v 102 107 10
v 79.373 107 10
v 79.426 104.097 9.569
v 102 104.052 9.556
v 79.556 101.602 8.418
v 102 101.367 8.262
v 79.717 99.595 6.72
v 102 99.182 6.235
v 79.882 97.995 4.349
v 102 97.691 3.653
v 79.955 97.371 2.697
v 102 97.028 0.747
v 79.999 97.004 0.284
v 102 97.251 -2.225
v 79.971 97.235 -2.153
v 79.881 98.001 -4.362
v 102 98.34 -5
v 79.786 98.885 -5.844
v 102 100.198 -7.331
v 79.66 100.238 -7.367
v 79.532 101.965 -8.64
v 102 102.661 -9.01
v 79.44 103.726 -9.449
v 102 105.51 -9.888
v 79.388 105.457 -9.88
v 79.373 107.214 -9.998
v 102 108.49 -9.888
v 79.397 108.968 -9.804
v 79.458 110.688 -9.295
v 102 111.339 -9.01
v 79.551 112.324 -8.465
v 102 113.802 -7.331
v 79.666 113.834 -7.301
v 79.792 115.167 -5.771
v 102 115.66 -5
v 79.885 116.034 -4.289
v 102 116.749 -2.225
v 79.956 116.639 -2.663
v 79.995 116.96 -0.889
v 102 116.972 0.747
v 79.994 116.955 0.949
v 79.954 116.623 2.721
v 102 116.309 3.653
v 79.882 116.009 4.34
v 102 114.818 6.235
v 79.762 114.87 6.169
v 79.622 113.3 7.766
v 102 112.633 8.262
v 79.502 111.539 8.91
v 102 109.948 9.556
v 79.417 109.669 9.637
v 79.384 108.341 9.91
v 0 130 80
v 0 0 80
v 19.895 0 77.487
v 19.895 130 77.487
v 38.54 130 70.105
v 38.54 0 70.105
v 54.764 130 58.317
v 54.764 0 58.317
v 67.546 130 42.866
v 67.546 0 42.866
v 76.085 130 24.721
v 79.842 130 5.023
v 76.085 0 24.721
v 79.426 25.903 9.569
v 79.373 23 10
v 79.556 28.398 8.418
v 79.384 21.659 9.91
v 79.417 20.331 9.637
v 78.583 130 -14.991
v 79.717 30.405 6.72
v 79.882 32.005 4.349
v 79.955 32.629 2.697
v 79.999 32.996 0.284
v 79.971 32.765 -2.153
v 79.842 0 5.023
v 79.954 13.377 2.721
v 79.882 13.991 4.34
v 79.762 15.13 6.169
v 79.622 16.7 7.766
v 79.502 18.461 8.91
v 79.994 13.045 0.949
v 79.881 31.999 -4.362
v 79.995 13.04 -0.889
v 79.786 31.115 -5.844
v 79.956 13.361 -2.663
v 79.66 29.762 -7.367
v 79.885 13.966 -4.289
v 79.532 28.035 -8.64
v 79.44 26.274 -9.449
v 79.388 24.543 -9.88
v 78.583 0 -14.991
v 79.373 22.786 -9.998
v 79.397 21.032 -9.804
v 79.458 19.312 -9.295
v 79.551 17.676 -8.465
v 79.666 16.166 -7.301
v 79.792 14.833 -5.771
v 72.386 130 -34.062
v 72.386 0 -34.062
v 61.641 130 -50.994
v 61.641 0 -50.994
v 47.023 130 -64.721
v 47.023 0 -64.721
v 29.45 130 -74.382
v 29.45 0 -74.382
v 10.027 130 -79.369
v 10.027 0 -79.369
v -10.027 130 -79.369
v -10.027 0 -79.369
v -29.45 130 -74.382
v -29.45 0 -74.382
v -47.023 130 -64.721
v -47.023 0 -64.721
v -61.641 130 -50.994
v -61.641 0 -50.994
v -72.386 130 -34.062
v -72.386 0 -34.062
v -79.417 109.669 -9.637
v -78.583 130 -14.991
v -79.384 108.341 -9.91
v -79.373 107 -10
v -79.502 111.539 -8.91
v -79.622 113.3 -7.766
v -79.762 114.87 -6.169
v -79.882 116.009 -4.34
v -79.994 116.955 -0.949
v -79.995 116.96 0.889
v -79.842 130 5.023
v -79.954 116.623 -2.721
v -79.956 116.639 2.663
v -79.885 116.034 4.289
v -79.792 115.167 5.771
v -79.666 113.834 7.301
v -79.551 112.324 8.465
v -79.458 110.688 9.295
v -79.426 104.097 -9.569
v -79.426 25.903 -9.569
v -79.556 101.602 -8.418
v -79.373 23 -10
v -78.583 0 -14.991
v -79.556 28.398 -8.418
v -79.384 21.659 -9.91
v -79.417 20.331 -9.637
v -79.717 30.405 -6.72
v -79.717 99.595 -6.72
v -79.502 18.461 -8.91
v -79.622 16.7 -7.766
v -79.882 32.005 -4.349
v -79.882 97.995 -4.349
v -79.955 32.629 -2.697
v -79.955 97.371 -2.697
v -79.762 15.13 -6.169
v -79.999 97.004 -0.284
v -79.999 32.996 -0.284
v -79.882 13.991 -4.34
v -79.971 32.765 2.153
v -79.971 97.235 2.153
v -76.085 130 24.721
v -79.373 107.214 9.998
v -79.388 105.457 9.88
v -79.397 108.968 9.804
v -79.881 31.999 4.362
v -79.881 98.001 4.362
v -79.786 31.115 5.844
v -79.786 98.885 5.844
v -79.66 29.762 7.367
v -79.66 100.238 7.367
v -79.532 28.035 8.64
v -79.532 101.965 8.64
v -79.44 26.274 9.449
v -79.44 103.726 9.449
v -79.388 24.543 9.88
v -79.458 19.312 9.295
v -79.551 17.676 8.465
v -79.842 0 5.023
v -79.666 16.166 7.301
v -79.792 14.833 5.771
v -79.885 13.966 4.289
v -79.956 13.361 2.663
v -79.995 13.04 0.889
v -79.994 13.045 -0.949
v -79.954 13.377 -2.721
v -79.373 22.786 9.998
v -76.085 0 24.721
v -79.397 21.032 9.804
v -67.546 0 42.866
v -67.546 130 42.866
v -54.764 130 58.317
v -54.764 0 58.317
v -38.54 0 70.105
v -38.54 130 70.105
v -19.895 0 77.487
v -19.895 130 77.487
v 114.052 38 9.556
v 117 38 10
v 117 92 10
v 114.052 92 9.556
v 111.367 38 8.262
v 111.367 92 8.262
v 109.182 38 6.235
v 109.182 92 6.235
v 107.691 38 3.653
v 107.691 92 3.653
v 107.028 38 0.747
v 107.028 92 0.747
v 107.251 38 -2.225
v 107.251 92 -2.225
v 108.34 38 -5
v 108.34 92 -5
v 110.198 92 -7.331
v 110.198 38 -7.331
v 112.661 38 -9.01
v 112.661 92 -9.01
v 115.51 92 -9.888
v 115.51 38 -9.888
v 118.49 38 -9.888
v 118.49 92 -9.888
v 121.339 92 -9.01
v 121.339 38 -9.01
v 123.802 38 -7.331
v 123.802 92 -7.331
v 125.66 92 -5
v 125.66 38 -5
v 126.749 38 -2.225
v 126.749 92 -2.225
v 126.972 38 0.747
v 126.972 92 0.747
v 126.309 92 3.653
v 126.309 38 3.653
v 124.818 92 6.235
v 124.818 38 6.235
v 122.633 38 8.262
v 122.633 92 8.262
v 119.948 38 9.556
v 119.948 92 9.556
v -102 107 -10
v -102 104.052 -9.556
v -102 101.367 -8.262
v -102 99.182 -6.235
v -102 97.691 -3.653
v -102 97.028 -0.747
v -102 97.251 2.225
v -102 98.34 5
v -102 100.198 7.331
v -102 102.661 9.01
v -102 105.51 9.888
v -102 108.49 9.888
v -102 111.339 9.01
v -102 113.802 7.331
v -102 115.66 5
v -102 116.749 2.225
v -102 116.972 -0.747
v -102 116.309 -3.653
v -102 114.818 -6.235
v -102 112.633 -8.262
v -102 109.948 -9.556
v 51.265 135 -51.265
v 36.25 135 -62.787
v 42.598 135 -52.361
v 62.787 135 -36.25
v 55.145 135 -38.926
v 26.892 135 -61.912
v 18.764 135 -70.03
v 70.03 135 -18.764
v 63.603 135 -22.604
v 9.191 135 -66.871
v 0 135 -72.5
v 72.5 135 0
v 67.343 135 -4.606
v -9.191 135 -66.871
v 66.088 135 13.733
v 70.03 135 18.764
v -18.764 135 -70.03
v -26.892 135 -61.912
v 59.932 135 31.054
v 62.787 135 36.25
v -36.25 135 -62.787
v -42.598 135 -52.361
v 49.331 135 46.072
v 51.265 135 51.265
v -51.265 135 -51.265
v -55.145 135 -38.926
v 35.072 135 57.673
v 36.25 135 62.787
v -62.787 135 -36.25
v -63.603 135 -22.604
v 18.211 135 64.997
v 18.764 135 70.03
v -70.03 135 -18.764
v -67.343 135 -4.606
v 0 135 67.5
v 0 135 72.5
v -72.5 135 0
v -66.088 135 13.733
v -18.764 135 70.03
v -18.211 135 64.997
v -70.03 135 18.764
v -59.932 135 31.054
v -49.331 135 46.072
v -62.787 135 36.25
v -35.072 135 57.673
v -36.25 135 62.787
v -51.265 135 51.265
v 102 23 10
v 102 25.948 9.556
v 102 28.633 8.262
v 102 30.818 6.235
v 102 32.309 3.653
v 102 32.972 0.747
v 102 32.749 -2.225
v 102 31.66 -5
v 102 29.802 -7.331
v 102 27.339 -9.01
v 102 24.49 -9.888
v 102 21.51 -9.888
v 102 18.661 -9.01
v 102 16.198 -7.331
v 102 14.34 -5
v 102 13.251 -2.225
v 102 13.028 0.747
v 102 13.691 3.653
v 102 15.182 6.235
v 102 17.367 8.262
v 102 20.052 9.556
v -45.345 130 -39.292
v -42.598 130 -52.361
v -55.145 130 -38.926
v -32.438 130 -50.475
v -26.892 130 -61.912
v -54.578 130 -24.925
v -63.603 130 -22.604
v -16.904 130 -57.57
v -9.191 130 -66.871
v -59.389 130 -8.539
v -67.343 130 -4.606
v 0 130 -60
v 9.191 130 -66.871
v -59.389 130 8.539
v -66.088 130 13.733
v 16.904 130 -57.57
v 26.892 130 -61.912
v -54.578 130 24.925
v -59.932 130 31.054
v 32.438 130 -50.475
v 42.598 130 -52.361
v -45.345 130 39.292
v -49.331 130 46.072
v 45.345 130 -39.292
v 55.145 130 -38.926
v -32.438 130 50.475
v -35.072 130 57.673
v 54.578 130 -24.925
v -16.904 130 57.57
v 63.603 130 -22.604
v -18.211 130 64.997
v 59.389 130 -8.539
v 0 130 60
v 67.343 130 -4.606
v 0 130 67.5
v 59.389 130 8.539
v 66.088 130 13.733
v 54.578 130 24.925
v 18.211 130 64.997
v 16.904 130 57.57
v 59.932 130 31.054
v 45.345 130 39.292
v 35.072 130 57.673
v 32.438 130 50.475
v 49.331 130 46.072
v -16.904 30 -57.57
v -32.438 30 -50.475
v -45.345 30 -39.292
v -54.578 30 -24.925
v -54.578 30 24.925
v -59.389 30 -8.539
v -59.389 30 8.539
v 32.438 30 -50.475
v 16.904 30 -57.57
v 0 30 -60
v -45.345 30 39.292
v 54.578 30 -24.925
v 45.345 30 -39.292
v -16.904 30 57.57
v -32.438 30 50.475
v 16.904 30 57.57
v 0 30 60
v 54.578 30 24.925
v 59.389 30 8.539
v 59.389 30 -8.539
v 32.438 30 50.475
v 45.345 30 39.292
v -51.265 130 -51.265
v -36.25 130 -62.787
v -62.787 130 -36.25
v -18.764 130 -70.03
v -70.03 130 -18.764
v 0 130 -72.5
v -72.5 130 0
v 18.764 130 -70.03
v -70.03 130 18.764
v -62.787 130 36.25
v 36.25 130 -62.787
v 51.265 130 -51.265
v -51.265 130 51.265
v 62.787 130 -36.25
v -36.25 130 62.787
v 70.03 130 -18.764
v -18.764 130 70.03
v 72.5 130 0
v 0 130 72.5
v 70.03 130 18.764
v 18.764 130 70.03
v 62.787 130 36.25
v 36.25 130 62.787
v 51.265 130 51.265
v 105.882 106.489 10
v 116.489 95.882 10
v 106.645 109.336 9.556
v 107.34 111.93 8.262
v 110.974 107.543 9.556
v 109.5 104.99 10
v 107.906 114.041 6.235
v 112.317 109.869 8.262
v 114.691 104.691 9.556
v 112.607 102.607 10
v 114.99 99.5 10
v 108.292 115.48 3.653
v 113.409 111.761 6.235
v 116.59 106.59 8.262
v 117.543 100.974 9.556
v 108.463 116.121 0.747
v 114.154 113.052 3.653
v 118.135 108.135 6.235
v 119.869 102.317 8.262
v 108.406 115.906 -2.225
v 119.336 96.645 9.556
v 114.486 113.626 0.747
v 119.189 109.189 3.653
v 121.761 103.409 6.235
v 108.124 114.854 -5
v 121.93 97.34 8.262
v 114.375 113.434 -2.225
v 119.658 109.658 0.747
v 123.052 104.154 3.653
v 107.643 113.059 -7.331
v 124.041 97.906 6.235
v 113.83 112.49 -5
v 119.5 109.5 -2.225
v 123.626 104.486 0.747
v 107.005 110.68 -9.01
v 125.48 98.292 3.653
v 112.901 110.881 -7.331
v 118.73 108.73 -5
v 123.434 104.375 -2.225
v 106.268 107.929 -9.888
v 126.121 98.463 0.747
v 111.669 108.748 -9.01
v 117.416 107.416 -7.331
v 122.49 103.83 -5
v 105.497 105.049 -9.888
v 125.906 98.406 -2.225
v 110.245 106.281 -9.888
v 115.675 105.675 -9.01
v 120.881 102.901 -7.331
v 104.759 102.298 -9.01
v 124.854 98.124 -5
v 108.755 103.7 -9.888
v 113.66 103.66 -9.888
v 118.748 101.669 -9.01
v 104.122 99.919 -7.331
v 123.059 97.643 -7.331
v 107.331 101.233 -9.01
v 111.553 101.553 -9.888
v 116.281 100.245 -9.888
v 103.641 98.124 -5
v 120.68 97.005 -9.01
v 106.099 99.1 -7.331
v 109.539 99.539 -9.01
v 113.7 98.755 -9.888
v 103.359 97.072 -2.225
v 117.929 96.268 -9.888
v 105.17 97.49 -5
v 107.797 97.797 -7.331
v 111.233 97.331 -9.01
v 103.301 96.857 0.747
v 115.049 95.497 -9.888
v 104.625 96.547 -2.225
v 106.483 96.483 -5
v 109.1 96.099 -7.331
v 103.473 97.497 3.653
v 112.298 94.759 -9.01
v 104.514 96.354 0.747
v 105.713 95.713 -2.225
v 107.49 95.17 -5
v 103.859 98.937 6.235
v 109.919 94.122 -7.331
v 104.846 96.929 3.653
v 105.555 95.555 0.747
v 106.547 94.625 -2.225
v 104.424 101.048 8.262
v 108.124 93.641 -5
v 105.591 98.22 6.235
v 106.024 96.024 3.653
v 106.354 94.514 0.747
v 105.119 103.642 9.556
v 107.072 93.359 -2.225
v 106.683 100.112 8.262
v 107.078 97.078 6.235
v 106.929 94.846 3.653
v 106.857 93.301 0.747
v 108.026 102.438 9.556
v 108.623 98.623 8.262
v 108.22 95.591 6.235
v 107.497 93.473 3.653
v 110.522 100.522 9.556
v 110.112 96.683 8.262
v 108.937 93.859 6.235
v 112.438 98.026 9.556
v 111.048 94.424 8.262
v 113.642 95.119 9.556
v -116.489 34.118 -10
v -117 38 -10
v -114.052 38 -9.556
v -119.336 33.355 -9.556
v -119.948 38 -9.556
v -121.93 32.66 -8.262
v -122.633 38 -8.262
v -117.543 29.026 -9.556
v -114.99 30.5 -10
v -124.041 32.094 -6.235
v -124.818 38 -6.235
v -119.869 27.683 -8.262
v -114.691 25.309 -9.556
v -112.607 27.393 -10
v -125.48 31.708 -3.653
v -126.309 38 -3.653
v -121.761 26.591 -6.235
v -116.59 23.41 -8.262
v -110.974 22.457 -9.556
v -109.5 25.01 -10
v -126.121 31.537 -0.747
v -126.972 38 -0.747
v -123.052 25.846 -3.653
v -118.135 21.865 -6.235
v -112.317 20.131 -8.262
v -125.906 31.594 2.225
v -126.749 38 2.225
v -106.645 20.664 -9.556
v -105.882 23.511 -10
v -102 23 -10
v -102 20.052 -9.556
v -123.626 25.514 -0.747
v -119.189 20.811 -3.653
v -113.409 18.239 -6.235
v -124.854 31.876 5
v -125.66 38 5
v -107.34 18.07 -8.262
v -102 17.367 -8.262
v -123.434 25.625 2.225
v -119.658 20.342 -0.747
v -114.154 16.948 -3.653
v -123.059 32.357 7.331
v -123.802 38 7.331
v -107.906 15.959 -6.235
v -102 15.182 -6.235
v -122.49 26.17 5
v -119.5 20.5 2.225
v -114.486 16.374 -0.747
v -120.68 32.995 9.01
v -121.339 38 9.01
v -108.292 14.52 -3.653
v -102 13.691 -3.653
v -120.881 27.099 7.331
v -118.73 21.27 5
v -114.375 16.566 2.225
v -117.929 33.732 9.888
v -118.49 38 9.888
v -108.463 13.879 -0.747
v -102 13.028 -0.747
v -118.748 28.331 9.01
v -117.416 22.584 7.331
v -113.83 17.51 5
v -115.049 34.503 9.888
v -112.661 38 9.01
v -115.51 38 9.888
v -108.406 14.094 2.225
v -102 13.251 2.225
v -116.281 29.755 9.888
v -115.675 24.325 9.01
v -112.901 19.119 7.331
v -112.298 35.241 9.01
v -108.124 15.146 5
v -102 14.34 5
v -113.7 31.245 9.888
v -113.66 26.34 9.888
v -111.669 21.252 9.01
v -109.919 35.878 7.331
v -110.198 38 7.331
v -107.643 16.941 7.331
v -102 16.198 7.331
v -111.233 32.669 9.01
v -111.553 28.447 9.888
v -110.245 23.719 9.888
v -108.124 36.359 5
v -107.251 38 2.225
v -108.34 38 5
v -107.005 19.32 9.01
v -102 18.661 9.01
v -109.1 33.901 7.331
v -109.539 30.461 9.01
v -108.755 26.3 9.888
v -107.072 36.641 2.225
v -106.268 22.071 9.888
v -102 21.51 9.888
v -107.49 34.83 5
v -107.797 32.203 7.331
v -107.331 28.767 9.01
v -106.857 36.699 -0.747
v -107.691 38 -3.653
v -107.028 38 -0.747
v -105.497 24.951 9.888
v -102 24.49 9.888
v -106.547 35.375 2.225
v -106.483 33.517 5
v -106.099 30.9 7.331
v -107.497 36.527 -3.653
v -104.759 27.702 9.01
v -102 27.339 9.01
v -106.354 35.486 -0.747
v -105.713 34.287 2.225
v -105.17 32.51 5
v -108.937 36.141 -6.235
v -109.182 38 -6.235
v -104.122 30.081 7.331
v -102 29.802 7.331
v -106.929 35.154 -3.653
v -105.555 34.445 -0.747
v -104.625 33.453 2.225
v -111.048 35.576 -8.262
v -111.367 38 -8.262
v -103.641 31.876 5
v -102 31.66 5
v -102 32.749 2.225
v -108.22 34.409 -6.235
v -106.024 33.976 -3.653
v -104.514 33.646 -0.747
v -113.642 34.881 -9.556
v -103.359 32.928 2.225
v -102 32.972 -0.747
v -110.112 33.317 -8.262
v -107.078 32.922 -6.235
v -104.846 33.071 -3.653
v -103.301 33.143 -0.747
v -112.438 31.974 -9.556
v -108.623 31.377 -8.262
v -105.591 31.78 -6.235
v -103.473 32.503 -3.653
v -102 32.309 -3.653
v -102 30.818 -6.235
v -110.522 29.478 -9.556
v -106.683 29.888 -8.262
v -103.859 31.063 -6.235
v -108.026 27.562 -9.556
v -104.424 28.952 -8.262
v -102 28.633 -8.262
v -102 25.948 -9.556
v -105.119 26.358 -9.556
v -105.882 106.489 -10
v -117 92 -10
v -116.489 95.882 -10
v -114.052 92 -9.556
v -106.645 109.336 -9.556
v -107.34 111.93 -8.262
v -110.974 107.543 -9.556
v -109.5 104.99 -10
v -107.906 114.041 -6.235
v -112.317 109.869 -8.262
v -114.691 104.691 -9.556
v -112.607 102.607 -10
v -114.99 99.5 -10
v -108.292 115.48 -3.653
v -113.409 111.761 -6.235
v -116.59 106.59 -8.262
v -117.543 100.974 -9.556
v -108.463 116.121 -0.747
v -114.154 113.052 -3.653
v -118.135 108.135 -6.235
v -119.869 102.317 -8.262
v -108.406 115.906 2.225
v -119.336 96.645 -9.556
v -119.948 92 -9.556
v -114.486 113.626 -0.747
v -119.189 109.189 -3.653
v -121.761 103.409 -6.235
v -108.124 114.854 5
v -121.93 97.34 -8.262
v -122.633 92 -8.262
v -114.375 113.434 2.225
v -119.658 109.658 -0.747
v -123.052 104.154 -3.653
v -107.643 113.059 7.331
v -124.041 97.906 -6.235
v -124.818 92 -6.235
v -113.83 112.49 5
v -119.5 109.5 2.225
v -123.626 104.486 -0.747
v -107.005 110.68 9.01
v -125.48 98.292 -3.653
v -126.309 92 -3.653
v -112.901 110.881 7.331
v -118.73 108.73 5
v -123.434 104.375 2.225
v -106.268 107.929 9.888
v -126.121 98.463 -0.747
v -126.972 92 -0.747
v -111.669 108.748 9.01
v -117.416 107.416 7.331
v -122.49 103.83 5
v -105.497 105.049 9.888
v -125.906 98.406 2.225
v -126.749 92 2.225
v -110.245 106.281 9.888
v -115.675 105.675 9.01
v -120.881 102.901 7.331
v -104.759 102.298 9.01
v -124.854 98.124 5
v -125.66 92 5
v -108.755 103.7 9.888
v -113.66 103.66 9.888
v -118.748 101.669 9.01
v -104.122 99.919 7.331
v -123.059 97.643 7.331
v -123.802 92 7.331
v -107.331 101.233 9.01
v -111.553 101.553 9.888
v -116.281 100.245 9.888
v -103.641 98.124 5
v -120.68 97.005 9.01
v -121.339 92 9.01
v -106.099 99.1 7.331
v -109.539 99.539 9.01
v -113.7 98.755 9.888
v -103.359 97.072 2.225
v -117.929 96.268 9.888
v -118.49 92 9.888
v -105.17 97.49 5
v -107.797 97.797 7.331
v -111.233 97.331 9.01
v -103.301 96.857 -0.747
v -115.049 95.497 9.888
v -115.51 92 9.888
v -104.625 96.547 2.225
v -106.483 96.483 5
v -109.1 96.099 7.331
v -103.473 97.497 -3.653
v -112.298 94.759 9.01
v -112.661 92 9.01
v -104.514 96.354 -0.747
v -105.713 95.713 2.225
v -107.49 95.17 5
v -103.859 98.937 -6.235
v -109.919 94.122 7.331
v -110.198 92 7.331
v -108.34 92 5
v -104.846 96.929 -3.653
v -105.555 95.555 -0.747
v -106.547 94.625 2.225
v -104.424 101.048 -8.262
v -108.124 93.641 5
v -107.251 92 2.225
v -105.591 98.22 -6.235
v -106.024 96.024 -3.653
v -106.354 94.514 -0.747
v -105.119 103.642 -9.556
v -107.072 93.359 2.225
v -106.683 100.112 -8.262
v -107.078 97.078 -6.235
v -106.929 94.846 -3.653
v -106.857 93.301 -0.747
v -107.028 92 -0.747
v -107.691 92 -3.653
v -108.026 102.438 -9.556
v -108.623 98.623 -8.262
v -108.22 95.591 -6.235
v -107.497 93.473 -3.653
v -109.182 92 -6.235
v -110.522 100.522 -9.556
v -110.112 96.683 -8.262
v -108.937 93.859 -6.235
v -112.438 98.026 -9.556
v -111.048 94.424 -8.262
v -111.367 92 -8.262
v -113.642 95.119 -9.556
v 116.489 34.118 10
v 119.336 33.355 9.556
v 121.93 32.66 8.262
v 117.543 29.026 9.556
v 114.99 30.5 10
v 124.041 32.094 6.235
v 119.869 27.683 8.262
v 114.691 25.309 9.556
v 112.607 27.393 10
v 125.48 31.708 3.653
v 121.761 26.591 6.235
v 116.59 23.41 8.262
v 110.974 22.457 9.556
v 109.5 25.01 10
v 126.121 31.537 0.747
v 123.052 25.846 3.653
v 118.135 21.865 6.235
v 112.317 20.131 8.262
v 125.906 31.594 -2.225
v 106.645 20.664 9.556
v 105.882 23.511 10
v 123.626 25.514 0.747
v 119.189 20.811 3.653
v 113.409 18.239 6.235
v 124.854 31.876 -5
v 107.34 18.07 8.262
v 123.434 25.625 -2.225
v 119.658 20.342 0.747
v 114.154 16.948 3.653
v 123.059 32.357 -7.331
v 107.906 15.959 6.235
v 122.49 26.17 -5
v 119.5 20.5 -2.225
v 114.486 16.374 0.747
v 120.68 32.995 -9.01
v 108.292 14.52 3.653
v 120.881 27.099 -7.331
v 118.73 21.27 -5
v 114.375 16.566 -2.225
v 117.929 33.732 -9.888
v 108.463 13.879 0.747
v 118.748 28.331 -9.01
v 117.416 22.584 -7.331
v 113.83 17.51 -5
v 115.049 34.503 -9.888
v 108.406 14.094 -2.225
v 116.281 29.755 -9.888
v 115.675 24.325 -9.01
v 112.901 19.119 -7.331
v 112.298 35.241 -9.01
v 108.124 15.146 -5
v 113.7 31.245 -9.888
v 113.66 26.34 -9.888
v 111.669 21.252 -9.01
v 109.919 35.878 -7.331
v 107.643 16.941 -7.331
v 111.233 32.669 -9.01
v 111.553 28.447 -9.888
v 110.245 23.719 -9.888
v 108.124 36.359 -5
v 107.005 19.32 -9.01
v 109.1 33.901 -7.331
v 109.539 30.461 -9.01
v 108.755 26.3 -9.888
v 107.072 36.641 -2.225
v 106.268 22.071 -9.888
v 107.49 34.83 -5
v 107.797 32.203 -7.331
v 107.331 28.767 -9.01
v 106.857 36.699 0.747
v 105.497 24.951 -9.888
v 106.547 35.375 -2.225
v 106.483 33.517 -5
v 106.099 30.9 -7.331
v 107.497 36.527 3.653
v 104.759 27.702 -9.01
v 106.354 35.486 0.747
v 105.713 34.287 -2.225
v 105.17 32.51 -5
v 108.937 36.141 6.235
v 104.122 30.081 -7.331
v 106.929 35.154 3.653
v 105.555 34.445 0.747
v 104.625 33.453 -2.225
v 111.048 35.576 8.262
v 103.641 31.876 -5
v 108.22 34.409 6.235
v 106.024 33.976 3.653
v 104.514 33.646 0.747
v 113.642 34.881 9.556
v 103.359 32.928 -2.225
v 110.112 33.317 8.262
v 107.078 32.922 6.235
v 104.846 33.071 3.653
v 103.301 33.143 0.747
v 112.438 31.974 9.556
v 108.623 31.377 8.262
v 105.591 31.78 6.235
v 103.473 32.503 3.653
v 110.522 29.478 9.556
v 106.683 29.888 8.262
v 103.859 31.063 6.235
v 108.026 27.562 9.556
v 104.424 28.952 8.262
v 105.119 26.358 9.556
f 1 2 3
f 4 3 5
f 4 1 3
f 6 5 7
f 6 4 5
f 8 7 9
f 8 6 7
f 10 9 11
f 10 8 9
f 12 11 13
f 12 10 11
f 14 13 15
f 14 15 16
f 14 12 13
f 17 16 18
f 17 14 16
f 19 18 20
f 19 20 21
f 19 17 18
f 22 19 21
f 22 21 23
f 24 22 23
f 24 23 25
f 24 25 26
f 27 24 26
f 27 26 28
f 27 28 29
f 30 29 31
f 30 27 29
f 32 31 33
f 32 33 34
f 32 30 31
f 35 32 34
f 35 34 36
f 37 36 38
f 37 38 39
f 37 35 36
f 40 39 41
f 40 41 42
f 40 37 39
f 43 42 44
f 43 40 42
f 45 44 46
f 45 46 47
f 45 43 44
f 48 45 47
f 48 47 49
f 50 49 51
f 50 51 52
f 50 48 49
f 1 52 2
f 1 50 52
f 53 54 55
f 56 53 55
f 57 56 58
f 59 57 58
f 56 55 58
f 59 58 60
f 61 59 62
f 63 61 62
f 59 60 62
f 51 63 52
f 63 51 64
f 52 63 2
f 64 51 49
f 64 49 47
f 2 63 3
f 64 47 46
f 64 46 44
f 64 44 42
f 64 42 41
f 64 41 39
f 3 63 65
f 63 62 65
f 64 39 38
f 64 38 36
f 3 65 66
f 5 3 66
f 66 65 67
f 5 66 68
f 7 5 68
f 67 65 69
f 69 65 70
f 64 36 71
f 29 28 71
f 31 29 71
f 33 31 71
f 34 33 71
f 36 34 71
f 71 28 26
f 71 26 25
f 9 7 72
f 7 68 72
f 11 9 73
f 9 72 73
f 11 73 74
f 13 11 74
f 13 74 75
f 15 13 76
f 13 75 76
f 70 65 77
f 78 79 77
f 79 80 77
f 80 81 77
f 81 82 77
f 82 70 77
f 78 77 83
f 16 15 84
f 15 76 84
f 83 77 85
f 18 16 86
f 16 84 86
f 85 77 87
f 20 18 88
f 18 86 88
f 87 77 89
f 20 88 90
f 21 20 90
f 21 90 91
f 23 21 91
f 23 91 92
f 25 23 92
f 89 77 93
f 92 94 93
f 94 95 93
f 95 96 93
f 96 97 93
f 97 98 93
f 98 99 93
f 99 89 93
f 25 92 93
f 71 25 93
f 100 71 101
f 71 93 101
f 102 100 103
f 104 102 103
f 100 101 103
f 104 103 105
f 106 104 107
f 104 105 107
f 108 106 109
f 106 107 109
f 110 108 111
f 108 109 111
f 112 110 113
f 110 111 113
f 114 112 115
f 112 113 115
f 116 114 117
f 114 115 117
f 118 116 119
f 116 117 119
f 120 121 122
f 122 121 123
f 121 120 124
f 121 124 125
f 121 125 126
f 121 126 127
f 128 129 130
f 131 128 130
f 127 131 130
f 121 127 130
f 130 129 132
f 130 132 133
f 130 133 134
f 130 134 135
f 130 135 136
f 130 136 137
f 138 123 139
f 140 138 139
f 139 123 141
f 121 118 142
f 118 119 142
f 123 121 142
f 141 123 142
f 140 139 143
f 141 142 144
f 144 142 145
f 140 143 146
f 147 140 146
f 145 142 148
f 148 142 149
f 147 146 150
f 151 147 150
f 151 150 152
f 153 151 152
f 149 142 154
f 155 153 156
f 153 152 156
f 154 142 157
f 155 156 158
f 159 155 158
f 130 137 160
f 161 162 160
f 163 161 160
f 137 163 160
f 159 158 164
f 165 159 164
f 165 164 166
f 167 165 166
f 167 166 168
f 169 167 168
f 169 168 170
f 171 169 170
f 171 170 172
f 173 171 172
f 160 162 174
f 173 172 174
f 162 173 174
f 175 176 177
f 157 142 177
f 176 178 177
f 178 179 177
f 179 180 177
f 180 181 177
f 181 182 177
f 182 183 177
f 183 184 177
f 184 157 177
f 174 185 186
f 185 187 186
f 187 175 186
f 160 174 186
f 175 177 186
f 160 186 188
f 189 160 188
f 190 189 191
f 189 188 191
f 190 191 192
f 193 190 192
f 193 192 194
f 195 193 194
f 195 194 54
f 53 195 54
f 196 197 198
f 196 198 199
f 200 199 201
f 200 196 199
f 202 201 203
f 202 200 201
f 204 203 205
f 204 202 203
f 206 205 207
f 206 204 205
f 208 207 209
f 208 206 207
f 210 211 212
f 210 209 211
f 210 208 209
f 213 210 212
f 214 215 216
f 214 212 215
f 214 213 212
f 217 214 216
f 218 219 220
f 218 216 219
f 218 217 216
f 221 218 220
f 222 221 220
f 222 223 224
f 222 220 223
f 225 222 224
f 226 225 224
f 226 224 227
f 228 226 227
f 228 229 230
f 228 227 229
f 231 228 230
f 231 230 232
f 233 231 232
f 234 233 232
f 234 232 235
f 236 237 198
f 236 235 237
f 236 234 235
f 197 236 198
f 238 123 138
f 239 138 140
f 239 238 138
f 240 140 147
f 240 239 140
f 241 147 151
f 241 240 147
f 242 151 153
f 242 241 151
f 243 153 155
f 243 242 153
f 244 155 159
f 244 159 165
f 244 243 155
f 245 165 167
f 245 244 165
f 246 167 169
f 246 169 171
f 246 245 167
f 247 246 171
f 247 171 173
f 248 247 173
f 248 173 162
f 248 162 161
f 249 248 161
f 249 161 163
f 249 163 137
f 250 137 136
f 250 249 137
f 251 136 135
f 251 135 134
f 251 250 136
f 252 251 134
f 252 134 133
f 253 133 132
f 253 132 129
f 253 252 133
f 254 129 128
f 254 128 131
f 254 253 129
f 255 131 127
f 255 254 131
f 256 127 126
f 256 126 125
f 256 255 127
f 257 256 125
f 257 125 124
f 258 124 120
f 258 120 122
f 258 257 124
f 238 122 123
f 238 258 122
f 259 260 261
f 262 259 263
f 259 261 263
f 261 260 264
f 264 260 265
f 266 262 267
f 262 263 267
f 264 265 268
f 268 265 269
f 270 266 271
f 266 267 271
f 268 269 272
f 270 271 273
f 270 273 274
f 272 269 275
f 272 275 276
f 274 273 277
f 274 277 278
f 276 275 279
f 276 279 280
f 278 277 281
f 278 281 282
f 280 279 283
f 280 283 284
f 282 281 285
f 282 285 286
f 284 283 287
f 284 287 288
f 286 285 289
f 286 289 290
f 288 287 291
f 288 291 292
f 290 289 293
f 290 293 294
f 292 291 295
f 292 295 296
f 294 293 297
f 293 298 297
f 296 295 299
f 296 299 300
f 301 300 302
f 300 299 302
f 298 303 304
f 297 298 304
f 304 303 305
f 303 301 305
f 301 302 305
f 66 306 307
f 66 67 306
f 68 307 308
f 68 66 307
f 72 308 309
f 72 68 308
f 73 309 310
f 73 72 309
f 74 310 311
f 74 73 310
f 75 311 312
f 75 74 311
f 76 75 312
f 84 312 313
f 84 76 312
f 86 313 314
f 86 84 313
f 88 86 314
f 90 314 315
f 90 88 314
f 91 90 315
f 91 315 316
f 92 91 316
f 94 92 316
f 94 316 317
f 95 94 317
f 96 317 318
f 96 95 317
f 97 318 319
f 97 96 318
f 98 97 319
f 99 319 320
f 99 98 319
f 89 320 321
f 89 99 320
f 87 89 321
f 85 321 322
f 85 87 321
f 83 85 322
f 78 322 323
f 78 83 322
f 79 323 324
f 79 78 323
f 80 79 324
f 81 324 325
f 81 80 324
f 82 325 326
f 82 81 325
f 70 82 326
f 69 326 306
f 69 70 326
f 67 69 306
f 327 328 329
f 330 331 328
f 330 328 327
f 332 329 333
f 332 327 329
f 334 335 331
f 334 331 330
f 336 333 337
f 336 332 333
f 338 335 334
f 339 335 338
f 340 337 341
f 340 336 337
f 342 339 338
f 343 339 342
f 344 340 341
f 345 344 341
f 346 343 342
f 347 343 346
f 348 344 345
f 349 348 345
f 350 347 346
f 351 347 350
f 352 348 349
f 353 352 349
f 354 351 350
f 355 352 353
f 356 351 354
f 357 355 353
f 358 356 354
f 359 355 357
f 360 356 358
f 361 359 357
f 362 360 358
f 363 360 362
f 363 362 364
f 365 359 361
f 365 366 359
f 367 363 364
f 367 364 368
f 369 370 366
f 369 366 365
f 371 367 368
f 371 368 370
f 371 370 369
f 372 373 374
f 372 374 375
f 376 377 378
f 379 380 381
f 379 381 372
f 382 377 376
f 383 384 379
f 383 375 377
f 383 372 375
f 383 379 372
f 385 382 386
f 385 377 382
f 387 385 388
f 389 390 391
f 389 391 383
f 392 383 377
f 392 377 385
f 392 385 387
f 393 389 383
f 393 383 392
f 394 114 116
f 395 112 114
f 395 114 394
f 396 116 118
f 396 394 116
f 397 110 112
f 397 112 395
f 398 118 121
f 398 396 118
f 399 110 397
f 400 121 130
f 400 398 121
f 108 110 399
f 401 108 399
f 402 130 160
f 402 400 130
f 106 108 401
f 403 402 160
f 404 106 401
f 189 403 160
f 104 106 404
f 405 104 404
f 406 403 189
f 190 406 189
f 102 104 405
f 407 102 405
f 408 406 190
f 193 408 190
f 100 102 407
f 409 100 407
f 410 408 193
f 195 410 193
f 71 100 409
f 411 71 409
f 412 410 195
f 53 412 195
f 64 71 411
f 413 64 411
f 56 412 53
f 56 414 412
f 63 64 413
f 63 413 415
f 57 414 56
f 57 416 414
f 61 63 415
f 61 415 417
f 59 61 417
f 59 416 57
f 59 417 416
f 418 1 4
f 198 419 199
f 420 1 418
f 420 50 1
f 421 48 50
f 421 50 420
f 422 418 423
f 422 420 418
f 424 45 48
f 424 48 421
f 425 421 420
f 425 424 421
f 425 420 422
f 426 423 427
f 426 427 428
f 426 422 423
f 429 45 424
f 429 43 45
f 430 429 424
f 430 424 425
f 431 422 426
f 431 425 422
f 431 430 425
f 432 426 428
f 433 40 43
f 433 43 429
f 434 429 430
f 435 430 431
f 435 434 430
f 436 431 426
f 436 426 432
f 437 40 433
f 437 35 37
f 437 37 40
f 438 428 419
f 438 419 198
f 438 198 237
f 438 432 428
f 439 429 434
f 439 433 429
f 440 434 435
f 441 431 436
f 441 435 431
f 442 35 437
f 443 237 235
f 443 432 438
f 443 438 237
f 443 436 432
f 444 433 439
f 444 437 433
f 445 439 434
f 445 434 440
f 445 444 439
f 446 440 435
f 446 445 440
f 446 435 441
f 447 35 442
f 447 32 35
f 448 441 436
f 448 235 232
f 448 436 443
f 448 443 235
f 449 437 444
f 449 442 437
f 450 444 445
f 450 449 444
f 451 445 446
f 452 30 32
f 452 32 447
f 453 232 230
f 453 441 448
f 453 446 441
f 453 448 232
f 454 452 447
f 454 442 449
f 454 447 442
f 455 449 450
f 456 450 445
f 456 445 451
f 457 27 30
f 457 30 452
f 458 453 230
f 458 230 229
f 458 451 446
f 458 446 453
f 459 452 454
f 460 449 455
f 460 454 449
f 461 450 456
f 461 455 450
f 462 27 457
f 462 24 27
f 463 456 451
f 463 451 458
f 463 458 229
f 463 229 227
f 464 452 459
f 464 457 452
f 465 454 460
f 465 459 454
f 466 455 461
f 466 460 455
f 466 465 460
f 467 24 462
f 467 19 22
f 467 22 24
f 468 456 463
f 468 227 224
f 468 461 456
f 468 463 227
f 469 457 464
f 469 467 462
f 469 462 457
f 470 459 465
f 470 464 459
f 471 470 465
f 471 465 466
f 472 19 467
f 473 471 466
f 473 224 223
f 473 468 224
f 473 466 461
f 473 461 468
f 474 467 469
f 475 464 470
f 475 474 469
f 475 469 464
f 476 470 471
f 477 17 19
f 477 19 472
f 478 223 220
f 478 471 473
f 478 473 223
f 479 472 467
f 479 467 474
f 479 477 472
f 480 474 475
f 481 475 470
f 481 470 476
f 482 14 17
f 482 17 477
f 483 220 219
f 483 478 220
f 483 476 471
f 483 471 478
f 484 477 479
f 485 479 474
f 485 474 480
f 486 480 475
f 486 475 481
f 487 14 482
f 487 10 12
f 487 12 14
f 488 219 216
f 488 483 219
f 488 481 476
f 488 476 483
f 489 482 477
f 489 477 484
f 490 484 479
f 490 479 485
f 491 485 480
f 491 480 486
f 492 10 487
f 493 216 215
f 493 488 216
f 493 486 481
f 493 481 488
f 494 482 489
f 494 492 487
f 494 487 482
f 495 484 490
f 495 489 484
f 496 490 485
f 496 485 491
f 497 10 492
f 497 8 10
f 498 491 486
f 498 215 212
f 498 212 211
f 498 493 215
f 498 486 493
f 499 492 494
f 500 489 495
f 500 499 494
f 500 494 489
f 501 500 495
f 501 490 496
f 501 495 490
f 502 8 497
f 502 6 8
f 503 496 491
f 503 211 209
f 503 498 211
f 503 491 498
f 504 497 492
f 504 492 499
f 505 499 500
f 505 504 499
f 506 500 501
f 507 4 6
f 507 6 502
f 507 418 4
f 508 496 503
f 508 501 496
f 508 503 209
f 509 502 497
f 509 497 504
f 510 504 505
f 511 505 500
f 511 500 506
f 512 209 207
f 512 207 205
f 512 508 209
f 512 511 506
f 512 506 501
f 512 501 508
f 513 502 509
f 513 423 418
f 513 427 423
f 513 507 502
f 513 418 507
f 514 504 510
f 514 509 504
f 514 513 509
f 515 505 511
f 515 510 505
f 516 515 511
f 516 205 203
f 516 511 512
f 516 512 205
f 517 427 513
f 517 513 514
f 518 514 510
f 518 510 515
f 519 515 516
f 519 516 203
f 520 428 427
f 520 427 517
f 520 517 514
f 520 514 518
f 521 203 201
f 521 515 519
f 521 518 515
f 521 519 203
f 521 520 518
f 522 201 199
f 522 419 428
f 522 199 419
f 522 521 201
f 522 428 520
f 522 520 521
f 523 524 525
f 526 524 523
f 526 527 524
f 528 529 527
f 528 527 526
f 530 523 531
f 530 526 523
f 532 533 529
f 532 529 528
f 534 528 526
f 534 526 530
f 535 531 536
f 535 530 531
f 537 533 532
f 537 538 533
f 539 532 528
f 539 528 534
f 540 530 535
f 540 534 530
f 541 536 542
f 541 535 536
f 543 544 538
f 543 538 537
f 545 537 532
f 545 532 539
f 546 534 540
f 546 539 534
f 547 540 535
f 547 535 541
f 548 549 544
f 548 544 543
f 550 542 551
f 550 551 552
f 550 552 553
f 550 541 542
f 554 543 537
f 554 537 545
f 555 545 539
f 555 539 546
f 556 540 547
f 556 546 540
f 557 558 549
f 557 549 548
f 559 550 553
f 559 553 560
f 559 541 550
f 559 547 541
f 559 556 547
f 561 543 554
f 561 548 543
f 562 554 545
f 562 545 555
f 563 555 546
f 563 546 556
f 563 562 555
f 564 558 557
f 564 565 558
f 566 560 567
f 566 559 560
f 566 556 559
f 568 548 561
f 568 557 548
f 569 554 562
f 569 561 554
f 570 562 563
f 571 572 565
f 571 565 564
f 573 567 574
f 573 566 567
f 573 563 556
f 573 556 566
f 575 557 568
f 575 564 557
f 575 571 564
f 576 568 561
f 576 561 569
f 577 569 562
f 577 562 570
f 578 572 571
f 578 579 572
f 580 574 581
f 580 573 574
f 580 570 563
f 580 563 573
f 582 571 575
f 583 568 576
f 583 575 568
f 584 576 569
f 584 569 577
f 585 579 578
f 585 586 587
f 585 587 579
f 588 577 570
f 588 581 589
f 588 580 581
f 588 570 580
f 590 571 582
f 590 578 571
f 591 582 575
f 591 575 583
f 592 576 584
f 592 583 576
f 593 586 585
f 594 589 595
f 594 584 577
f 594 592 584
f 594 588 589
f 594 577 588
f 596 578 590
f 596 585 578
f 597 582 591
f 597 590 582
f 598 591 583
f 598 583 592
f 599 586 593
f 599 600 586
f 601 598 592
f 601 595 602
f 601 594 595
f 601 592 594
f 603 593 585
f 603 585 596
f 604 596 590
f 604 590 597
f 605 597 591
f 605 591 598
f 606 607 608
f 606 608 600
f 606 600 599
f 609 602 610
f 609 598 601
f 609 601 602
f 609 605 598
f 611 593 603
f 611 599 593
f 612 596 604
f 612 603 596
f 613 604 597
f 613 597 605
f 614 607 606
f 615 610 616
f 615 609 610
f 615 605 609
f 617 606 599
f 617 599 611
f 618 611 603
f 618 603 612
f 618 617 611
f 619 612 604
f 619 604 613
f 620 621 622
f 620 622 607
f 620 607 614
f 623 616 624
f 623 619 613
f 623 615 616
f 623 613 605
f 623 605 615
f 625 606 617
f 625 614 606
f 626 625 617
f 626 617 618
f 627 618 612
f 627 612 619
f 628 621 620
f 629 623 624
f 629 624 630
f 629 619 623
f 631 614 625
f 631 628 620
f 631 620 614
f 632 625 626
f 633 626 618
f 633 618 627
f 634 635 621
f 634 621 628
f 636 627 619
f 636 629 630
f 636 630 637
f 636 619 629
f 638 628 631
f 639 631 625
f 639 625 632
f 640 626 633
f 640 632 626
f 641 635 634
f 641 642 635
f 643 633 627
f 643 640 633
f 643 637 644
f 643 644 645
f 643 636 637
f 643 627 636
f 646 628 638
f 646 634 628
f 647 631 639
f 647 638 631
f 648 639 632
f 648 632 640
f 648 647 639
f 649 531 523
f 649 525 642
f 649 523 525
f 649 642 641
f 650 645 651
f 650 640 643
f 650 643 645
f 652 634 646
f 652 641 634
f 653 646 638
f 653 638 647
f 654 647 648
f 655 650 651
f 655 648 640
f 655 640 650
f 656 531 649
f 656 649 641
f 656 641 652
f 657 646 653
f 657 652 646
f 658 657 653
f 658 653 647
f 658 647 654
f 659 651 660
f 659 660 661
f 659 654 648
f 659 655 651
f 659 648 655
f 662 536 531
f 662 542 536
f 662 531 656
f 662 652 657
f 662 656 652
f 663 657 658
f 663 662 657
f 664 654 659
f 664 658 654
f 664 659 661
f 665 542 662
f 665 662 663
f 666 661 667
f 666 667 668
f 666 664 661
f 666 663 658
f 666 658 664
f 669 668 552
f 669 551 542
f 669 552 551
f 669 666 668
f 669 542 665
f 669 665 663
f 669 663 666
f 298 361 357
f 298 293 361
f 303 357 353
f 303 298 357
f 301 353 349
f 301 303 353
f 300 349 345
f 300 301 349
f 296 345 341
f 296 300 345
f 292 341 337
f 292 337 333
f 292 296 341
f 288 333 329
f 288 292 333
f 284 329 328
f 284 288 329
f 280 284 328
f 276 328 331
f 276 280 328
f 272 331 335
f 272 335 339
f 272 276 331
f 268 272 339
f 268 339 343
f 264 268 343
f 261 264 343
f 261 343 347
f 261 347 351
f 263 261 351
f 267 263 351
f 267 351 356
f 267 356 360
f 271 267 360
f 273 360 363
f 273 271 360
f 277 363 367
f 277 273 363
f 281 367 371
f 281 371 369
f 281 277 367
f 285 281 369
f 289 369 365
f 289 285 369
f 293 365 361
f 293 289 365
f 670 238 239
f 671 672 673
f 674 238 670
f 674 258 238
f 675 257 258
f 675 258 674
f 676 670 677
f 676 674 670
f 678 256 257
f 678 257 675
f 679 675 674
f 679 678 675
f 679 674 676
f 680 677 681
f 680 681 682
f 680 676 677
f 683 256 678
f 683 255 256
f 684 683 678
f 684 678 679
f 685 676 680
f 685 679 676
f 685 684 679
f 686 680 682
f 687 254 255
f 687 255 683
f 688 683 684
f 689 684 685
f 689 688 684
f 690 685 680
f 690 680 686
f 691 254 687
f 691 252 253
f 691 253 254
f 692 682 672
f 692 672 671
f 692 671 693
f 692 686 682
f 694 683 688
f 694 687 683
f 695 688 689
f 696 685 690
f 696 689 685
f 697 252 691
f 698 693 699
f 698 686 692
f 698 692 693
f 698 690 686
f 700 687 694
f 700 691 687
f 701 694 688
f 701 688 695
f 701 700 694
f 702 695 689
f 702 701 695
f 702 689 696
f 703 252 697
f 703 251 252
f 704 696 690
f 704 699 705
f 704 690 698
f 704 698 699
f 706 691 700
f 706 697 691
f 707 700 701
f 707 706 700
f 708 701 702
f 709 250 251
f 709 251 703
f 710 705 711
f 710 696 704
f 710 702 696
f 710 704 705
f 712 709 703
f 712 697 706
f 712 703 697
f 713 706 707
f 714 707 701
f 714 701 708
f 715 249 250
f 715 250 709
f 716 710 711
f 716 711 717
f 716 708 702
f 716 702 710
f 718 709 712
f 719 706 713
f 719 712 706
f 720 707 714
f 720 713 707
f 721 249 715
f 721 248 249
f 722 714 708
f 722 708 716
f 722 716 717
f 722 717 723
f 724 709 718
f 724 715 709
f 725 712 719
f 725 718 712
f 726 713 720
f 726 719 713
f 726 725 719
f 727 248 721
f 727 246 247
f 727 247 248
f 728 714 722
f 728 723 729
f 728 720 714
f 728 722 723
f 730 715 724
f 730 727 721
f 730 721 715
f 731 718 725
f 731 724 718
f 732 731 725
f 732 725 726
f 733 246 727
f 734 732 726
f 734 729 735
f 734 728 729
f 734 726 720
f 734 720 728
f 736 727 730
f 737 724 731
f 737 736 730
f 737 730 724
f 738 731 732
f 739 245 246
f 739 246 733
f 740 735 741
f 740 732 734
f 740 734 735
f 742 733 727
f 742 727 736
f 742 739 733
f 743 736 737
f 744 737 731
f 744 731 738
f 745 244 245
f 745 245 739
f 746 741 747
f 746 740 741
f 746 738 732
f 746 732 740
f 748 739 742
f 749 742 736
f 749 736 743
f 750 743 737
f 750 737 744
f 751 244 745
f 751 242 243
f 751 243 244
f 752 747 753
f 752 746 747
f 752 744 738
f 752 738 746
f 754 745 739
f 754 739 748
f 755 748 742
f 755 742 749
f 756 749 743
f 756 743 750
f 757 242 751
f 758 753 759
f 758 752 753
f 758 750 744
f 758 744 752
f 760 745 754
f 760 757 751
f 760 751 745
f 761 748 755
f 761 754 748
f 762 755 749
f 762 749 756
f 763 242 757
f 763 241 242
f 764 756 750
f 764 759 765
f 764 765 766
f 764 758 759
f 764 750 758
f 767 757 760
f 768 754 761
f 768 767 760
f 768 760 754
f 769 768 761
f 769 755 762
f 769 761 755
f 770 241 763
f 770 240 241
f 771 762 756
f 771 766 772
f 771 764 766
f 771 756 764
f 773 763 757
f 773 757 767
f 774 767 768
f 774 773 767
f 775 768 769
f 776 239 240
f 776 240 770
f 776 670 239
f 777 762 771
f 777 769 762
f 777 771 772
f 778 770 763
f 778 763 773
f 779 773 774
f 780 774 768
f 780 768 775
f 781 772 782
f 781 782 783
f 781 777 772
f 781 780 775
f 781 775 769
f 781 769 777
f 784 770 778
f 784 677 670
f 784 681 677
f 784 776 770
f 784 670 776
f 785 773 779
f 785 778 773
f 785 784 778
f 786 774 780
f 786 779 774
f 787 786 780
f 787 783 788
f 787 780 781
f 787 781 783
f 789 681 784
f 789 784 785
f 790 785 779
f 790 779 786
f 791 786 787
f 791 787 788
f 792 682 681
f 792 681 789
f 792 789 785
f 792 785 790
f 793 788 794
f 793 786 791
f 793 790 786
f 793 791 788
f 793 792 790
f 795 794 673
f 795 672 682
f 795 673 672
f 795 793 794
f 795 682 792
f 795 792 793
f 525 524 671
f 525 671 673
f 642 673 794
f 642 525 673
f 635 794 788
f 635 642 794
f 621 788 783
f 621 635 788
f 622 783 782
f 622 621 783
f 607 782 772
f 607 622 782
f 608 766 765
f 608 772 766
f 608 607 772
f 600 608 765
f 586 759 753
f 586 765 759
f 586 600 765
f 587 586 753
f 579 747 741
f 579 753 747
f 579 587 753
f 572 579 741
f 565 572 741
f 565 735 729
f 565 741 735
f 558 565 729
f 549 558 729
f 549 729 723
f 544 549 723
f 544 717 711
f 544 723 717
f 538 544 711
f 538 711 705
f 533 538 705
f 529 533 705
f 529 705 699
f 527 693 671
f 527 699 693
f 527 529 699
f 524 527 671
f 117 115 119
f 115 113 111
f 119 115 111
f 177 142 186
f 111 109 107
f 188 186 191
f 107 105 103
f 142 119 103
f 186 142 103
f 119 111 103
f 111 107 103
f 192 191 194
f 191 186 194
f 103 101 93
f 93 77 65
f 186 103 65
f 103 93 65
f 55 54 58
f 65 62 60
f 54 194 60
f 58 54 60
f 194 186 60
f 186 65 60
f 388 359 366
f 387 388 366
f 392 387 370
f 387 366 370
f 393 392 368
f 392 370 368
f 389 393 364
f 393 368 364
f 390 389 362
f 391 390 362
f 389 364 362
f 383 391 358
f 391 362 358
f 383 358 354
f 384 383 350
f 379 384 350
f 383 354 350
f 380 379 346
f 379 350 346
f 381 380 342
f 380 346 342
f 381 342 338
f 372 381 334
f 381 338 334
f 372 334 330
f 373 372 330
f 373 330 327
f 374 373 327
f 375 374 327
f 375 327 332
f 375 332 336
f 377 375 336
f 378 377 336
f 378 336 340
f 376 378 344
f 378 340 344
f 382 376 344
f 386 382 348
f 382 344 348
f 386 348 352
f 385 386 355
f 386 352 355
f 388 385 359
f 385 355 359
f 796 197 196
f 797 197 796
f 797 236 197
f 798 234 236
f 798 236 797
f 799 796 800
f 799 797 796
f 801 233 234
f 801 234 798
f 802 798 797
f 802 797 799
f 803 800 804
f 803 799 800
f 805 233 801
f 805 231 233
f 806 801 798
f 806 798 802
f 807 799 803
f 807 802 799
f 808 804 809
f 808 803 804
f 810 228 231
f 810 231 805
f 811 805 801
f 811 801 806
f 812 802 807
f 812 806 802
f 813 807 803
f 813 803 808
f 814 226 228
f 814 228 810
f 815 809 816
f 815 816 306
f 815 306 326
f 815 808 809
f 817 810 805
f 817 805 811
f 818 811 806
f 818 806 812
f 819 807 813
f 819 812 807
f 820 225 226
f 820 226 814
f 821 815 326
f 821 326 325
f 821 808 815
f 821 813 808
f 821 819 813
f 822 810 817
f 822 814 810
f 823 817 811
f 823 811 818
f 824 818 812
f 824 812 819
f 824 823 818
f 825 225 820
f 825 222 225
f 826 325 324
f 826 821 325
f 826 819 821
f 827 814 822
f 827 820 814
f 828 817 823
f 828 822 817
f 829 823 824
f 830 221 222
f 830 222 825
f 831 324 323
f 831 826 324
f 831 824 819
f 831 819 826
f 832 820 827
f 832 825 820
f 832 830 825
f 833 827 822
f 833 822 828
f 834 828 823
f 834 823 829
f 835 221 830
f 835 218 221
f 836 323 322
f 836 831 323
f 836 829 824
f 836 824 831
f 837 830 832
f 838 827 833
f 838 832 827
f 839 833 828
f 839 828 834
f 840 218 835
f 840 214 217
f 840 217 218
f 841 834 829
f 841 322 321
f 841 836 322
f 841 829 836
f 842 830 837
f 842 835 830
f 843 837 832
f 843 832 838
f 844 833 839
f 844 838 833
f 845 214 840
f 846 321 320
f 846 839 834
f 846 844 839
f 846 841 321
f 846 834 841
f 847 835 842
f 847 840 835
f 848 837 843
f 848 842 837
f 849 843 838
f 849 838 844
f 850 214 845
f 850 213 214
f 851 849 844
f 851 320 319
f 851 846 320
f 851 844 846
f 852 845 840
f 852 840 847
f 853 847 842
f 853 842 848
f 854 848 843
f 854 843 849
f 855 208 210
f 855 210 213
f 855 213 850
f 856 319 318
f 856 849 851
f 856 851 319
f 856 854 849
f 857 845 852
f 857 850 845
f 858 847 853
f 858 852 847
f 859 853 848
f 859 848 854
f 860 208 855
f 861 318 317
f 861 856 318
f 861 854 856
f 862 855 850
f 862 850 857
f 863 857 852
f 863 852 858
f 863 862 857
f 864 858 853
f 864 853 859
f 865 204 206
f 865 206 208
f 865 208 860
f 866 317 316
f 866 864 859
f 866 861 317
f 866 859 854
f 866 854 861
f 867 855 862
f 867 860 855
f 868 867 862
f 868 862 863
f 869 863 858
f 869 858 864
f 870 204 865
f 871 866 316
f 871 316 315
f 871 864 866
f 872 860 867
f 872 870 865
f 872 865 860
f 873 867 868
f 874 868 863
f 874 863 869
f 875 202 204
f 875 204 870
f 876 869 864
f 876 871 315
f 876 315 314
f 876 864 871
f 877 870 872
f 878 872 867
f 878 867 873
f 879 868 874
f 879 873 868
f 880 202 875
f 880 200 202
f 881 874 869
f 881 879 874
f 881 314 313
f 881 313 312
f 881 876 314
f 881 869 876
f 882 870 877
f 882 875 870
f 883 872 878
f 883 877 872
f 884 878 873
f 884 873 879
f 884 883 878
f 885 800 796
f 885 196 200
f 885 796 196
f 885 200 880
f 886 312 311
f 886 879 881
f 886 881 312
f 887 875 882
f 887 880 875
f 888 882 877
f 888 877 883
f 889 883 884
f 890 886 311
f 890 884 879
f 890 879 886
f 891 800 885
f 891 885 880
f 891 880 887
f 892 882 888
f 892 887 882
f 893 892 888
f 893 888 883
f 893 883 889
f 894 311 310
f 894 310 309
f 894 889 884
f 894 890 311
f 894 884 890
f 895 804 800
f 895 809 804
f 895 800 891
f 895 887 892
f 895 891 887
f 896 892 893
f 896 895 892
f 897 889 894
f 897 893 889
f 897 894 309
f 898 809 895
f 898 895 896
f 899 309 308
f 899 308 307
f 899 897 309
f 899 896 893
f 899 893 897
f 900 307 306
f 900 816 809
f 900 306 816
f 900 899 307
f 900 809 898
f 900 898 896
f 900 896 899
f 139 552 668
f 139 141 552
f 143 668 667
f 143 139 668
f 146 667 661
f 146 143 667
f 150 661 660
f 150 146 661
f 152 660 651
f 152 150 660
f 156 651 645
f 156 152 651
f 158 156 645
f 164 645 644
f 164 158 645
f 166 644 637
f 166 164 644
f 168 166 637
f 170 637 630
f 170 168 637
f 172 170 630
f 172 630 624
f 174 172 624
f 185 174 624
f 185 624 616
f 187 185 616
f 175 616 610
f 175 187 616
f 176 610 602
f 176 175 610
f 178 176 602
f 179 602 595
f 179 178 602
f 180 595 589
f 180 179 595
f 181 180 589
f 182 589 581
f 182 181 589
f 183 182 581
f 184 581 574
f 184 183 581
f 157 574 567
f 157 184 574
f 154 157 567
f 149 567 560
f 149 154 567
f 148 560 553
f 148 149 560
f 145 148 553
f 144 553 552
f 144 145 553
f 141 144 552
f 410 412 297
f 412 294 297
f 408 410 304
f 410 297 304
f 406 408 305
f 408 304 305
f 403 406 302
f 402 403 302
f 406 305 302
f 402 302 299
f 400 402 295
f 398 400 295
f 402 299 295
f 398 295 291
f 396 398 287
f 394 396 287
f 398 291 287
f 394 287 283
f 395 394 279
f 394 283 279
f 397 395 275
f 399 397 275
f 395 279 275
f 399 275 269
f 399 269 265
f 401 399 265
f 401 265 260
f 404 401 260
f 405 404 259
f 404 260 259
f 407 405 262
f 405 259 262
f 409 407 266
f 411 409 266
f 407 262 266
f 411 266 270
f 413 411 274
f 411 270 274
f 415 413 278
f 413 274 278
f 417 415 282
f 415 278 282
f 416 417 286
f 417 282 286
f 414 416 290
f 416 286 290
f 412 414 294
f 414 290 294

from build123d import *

# Parameters (mm, degrees)
ESBO_O1_R                = 80
RESSALTO_EXTRUS_O1_DEPTH = 130
ESBO_O2_R                = 60
CORTE_EXTRUS_O1_DEPTH    = 100
ESBO_O4_W                = 5
ESBO_O4_H                = 5
VARREDURA2_PROFILE_R     = 10
VARREDURA3_PROFILE_R     = 10


with BuildPart() as part:
    # Esboço1 → Ressalto-extrusão1 (new body)
    with BuildSketch(Plane(origin=(0, 0, 0), x_dir=(1, 0, 0), z_dir=(0, 1, 0))):
        with Locations(Location((0, 0, 0), (0, 0, 270))):
            Circle(ESBO_O1_R)
    extrude(amount=RESSALTO_EXTRUS_O1_DEPTH)

    # Esboço2 → Corte-extrusão1 (cut)
    with BuildSketch(Plane(origin=(0, 130, 0), x_dir=(1, 0, 0), z_dir=(0, 1, 0))):
        with Locations(Location((0, 0, 0), (0, 0, 270))):
            Circle(ESBO_O2_R)
    extrude(amount=-CORTE_EXTRUS_O1_DEPTH, mode=Mode.SUBTRACT)

    # Esboço4 → Revolução1 (revolve)
    with BuildSketch(Plane(origin=(0, 0, 0), x_dir=(0, 0, -1), z_dir=(1, 0, 0))):
        with Locations((-70, 132.5)):
            Rectangle(ESBO_O4_W, ESBO_O4_H)
    revolve(axis=Axis((0, 130, 0), (0, -1, 0)))

    # Varredura2: sweep along a path in Esboço6
    with BuildLine(Plane.XY) as varredura2_path:
        Line((70, 107), (102, 107))
        ThreePointArc((102, 107), (112.606601718, 102.606601718), (117, 92))
        Line((117, 92), (117, 38))
        ThreePointArc((117, 38), (112.606601718, 27.393398282), (102, 23))
        Line((102, 23), (70, 23))
    # Varredura2 profile (on start of the path) → Varredura2 (sweep)
    with BuildSketch(Plane(origin=(70, 107, 0), x_dir=(0, 0, 1), z_dir=(1, 0, 0))):
        Circle(VARREDURA2_PROFILE_R)
    sweep(path=varredura2_path.line)

    # Varredura3: sweep along a path in Esboço36
    with BuildLine(Plane.XY) as varredura3_path:
        Line((-70, 107), (-102, 107))
        ThreePointArc((-102, 107), (-112.606601718, 102.606601718), (-117, 92))
        Line((-117, 92), (-117, 38))
        ThreePointArc((-117, 38), (-112.606601718, 27.393398282), (-102, 23))
        Line((-102, 23), (-70, 23))
    # Varredura3 profile (on start of the path) → Varredura3 (sweep)
    with BuildSketch(Plane(origin=(-70, 107, 0), x_dir=(0, 0, -1), z_dir=(-1, 0, 0))):
        Circle(VARREDURA3_PROFILE_R)
    sweep(path=varredura3_path.line)


solid = part.part
